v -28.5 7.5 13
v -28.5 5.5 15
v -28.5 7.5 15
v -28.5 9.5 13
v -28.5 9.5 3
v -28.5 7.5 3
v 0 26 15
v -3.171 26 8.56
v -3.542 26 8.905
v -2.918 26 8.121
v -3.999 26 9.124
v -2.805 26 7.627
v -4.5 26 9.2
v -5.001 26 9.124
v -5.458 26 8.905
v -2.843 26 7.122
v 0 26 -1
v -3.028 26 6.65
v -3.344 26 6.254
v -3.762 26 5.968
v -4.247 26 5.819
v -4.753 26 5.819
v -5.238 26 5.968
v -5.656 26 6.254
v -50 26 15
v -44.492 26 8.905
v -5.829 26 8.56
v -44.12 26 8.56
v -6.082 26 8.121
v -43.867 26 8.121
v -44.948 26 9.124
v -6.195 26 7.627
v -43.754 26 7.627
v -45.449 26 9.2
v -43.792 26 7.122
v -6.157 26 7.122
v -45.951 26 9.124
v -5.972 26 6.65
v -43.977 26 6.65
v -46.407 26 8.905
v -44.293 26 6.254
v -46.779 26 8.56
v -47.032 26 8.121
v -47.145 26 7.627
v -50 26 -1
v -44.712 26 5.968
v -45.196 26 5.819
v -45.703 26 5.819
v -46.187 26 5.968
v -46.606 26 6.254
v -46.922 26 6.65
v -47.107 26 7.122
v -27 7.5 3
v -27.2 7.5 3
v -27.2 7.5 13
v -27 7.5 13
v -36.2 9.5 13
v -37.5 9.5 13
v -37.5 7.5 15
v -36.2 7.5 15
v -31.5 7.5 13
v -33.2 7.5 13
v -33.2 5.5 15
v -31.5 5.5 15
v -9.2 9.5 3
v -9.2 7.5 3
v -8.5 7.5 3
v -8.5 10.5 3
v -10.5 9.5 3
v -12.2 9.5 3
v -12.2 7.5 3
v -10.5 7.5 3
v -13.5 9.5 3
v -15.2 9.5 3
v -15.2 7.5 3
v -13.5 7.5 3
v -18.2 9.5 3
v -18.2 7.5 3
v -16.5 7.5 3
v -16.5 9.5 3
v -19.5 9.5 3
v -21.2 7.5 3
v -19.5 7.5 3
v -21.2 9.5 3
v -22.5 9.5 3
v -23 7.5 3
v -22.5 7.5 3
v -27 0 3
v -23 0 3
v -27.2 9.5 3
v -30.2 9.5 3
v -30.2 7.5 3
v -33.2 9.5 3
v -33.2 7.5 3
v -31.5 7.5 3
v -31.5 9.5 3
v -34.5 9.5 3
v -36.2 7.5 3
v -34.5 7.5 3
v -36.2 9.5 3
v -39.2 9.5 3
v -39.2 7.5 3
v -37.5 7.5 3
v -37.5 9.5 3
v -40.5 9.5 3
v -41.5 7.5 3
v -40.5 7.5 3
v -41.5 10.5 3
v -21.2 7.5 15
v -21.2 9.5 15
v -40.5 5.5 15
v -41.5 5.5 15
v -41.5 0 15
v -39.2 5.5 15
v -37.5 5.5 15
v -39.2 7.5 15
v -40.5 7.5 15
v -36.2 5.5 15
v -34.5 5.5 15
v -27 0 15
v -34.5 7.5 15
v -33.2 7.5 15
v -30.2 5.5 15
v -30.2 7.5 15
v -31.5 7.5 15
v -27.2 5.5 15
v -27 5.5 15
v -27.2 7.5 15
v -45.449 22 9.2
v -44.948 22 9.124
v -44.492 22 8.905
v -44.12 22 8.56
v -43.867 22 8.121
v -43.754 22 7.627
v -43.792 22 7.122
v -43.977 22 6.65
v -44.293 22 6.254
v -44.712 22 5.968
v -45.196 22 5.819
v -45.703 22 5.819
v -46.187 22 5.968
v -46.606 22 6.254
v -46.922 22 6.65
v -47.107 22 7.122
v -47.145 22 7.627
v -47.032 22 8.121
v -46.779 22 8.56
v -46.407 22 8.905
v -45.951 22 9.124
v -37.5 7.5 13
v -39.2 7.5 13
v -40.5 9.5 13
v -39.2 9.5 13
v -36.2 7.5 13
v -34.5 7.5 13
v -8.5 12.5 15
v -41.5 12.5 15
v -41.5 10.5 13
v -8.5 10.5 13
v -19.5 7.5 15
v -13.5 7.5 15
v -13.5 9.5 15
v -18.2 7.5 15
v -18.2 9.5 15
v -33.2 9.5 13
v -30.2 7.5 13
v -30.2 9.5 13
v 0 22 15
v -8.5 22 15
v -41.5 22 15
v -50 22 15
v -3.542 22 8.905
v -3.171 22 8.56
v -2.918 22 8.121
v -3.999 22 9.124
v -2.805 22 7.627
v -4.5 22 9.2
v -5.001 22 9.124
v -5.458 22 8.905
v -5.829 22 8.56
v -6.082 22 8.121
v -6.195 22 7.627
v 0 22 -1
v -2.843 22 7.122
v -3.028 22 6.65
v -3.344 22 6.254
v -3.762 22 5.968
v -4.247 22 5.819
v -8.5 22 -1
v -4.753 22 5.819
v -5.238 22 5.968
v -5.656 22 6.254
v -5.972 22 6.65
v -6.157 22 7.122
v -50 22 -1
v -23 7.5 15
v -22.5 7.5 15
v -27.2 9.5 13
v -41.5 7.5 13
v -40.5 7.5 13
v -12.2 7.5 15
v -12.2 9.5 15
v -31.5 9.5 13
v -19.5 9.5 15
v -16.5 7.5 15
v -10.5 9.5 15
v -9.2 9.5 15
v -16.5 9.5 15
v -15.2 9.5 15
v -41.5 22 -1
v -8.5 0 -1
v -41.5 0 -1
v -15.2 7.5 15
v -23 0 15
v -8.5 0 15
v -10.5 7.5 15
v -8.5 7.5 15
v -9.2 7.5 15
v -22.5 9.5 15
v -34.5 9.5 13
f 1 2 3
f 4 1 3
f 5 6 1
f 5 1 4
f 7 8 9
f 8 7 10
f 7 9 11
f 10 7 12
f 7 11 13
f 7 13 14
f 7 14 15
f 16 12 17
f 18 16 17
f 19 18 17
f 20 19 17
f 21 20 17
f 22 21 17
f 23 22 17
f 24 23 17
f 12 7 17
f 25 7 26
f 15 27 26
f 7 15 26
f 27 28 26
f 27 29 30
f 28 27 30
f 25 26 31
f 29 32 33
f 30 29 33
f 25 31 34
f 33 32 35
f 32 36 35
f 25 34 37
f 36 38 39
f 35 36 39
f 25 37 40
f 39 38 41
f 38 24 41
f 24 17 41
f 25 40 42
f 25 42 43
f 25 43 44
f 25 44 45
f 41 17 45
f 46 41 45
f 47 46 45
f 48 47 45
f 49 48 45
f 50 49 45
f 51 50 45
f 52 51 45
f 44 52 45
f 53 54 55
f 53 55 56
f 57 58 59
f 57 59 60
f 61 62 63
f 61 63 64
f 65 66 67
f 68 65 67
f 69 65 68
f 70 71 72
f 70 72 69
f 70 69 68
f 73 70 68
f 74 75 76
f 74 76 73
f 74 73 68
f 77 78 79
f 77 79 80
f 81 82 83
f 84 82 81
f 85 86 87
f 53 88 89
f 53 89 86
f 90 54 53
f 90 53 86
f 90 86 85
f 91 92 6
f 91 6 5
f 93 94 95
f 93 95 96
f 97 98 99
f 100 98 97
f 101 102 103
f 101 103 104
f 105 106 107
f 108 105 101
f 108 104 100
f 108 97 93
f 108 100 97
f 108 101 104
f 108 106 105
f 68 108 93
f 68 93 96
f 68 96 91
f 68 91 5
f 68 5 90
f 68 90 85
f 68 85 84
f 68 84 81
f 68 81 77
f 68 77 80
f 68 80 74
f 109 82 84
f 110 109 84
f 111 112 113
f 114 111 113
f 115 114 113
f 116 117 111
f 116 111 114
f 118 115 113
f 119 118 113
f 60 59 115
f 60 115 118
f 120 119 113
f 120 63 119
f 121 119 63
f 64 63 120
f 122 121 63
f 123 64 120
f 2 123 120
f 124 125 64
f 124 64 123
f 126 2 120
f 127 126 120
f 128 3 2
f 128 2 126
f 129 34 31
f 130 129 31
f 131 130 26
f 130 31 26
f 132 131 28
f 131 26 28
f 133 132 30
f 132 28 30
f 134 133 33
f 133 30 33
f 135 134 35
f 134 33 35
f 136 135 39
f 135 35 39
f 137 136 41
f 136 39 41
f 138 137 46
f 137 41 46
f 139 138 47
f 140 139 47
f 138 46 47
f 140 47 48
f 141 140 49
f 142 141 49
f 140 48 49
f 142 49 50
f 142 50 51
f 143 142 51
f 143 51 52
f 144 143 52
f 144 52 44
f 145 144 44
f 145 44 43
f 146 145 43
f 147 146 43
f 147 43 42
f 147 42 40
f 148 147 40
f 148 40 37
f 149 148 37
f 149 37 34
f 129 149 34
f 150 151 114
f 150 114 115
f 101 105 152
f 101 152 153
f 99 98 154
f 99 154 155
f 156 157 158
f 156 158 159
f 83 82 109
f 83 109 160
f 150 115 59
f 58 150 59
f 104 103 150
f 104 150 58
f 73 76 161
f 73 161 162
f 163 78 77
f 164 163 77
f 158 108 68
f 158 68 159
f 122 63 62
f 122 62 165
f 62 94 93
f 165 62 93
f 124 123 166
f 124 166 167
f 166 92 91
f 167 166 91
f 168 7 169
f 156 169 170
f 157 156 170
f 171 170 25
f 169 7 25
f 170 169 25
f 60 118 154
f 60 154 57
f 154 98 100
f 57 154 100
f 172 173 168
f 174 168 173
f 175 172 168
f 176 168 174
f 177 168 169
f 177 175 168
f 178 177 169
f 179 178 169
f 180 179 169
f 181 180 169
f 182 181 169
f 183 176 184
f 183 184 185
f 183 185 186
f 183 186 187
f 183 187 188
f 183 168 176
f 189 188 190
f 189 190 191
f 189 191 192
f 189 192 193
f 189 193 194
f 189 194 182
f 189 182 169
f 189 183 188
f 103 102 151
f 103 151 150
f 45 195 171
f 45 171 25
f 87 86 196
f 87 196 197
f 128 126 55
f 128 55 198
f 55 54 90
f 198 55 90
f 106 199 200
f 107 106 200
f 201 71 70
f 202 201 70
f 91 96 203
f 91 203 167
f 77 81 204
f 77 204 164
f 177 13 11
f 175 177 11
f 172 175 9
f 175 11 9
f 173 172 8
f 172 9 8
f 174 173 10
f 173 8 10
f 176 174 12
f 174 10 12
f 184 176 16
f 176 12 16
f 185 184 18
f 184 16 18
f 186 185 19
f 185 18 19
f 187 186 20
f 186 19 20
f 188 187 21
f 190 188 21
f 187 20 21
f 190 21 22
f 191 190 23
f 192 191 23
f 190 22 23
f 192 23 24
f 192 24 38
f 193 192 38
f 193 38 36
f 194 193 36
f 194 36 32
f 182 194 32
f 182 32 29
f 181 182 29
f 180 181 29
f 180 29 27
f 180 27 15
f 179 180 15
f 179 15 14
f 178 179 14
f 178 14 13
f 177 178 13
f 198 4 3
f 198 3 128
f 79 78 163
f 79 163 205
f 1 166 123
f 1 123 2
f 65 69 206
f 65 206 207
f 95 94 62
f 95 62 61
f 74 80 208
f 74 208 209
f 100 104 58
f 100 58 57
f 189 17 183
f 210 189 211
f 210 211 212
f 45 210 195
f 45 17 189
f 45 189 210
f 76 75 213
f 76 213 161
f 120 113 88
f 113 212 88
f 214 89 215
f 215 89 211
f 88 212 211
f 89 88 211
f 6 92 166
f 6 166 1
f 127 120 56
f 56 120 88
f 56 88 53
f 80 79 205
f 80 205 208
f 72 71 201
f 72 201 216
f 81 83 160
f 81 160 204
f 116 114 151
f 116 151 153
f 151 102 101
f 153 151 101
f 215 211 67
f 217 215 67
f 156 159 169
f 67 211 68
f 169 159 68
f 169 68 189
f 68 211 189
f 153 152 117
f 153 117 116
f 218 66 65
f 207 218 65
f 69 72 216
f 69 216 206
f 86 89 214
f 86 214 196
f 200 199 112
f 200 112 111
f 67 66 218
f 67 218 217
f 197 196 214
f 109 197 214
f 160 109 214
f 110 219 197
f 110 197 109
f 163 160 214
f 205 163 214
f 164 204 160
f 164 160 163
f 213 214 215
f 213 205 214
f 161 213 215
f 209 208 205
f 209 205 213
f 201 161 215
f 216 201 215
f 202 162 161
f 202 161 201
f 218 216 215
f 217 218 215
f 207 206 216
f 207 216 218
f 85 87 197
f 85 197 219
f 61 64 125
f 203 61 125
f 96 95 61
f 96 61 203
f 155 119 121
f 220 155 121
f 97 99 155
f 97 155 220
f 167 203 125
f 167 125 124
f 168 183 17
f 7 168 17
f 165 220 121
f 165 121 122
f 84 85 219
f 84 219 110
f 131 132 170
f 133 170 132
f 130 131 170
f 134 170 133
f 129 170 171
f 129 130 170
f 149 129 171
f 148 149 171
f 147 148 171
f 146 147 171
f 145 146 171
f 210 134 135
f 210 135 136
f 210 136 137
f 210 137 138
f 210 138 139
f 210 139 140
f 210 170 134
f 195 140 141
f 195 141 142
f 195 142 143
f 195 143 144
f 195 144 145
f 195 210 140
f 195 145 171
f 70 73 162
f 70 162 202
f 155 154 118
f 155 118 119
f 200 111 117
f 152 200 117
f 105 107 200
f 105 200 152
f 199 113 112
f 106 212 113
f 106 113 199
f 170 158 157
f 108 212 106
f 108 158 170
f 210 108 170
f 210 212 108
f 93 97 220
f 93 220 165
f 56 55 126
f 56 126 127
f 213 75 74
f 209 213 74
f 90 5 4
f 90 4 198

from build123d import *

# Parameters (mm, degrees)
SKETCH1_W            = 50
SKETCH1_H            = 26
BOSS_EXTRUDE1_DEPTH  = 16
SKETCH2_W            = 8.5
SKETCH2_H            = 22
CUT_EXTRUDE1_DEPTH   = 59.583274064
SKETCH3_W            = 8.5
SKETCH3_H            = 22
CUT_EXTRUDE2_DEPTH   = 59.583274064
SKETCH4_W            = 12
SKETCH4_H            = 10.5
CUT_EXTRUDE3_DEPTH   = 52.217672731
SKETCH5_W            = 14.5
SKETCH5_H            = 7.5
BOSS_EXTRUDE2_DEPTH  = 12
SKETCH6_W            = 1.3
SKETCH6_H            = 2
BOSS_EXTRUDE3_DEPTH  = 12
SKETCH7_W            = 1.3
SKETCH7_H            = 2
BOSS_EXTRUDE4_DEPTH  = 12
SKETCH8_W            = 1.3
SKETCH8_H            = 2
BOSS_EXTRUDE5_DEPTH  = 12
SKETCH9_W            = 1.3
SKETCH9_H            = 2
BOSS_EXTRUDE6_DEPTH  = 12
SKETCH10_W           = 1.3
SKETCH10_H           = 2
BOSS_EXTRUDE7_DEPTH  = 12
SKETCH11_W           = 14.5
SKETCH11_H           = 7.5
BOSS_EXTRUDE8_DEPTH  = 12
SKETCH12_W           = 1.3
SKETCH12_H           = 2
BOSS_EXTRUDE9_DEPTH  = 12
SKETCH13_W           = 1.3
SKETCH13_H           = 2
BOSS_EXTRUDE10_DEPTH = 12
SKETCH14_W           = 1.3
SKETCH14_H           = 2
BOSS_EXTRUDE11_DEPTH = 12
SKETCH15_W           = 1.3
SKETCH15_H           = 2
BOSS_EXTRUDE12_DEPTH = 12
SKETCH16_W           = 1.3
SKETCH16_H           = 2
BOSS_EXTRUDE13_DEPTH = 12
SKETCH17_R           = 1.7
CUT_EXTRUDE4_DEPTH   = 59.318093247
SKETCH18_R           = 1.7
CUT_EXTRUDE5_DEPTH   = 59.318093247
CHAMFER2_SIZE        = 2


with BuildPart() as part:
    # Sketch1 → Boss-Extrude1 (new body)
    with BuildSketch(Plane(origin=(0, 0, -1), x_dir=(-1, 0, 0), z_dir=(0, 0, -1))):
        with Locations((25, 13)):
            Rectangle(SKETCH1_W, SKETCH1_H)
    extrude(amount=-BOSS_EXTRUDE1_DEPTH)

    # Sketch2 → Cut-Extrude1 (cut, through all)
    with BuildSketch(Plane(origin=(0, 0, -1), x_dir=(-1, 0, 0), z_dir=(0, 0, -1))):
        with Locations((45.75, 11)):
            Rectangle(SKETCH2_W, SKETCH2_H)
    extrude(amount=-CUT_EXTRUDE1_DEPTH, mode=Mode.SUBTRACT)

    # Sketch3 → Cut-Extrude2 (cut, through all)
    with BuildSketch(Plane(origin=(0, 0, -1), x_dir=(-1, 0, 0), z_dir=(0, 0, -1))):
        with Locations((4.25, 11)):
            Rectangle(SKETCH3_W, SKETCH3_H)
    extrude(amount=-CUT_EXTRUDE2_DEPTH, mode=Mode.SUBTRACT)

    # Sketch4 → Cut-Extrude3 (cut, through all)
    with BuildSketch(Plane.ZY.offset(41.5)):
        with Locations((9, 5.25)):
            Rectangle(SKETCH4_W, SKETCH4_H)
    extrude(amount=-CUT_EXTRUDE3_DEPTH, mode=Mode.SUBTRACT)

    # Sketch5 → Boss-Extrude2 (add)
    with BuildSketch(Plane.XY.offset(3)):
        with Locations((-15.75, 3.75)):
            Rectangle(SKETCH5_W, SKETCH5_H)
    extrude(amount=BOSS_EXTRUDE2_DEPTH)

    # Sketch6 → Boss-Extrude3 (add)
    with BuildSketch(Plane.XY.offset(3)):
        with Locations((-9.85, 8.5)):
            Rectangle(SKETCH6_W, SKETCH6_H)
    extrude(amount=BOSS_EXTRUDE3_DEPTH)

    # Sketch7 → Boss-Extrude4 (add)
    with BuildSketch(Plane.XY.offset(3)):
        with Locations((-12.85, 8.5)):
            Rectangle(SKETCH7_W, SKETCH7_H)
    extrude(amount=BOSS_EXTRUDE4_DEPTH)

    # Sketch8 → Boss-Extrude5 (add)
    with BuildSketch(Plane.XY.offset(3)):
        with Locations((-15.85, 8.5)):
            Rectangle(SKETCH8_W, SKETCH8_H)
    extrude(amount=BOSS_EXTRUDE5_DEPTH)

    # Sketch9 → Boss-Extrude6 (add)
    with BuildSketch(Plane.XY.offset(3)):
        with Locations((-18.85, 8.5)):
            Rectangle(SKETCH9_W, SKETCH9_H)
    extrude(amount=BOSS_EXTRUDE6_DEPTH)

    # Sketch10 → Boss-Extrude7 (add)
    with BuildSketch(Plane.XY.offset(3)):
        with Locations((-21.85, 8.5)):
            Rectangle(SKETCH10_W, SKETCH10_H)
    extrude(amount=BOSS_EXTRUDE7_DEPTH)

    # Sketch11 → Boss-Extrude8 (add)
    with BuildSketch(Plane.XY.offset(3)):
        with Locations((-34.25, 3.75)):
            Rectangle(SKETCH11_W, SKETCH11_H)
    extrude(amount=BOSS_EXTRUDE8_DEPTH)

    # Sketch12 → Boss-Extrude9 (add)
    with BuildSketch(Plane.XY.offset(3)):
        with Locations((-27.85, 8.5)):
            Rectangle(SKETCH12_W, SKETCH12_H)
    extrude(amount=BOSS_EXTRUDE9_DEPTH)

    # Sketch13 → Boss-Extrude10 (add)
    with BuildSketch(Plane.XY.offset(3)):
        with Locations((-30.85, 8.5)):
            Rectangle(SKETCH13_W, SKETCH13_H)
    extrude(amount=BOSS_EXTRUDE10_DEPTH)

    # Sketch14 → Boss-Extrude11 (add)
    with BuildSketch(Plane.XY.offset(3)):
        with Locations((-33.85, 8.5)):
            Rectangle(SKETCH14_W, SKETCH14_H)
    extrude(amount=BOSS_EXTRUDE11_DEPTH)

    # Sketch15 → Boss-Extrude12 (add)
    with BuildSketch(Plane.XY.offset(3)):
        with Locations((-36.85, 8.5)):
            Rectangle(SKETCH15_W, SKETCH15_H)
    extrude(amount=BOSS_EXTRUDE12_DEPTH)

    # Sketch16 → Boss-Extrude13 (add)
    with BuildSketch(Plane.XY.offset(3)):
        with Locations((-39.85, 8.5)):
            Rectangle(SKETCH16_W, SKETCH16_H)
    extrude(amount=BOSS_EXTRUDE13_DEPTH)

    # Sketch17 → Cut-Extrude4 (cut, through all)
    with BuildSketch(Plane(origin=(0, 26, 0), x_dir=(-1, 0, 0), z_dir=(0, 1, 0))):
        with Locations(Location((4.5, 7.5, 0), (0, 0, 90))):
            Circle(SKETCH17_R)
    extrude(amount=-CUT_EXTRUDE4_DEPTH, mode=Mode.SUBTRACT)

    # Sketch18 → Cut-Extrude5 (cut, through all)
    with BuildSketch(Plane(origin=(0, 26, 0), x_dir=(-1, 0, 0), z_dir=(0, 1, 0))):
        with Locations(Location((45.449445698, 7.5, 0), (0, 0, 90))):
            Circle(SKETCH18_R)
    extrude(amount=-CUT_EXTRUDE5_DEPTH, mode=Mode.SUBTRACT)

    # Chamfer2
    chamfer2_edges = [part.edges().sort_by_distance(p)[0] for p in [
        (-39.85, 9.5, 15),
        (-38.35, 7.5, 15),
        (-36.85, 9.5, 15),
        (-35.35, 7.5, 15),
        (-33.85, 9.5, 15),
        (-32.35, 7.5, 15),
        (-30.85, 9.5, 15),
        (-29.35, 7.5, 15),
        (-27.85, 9.5, 15),
        (-27.1, 7.5, 15),
        (-41, 7.5, 15),
        (-25, 10.5, 15),
    ]]
    chamfer(chamfer2_edges, length=CHAMFER2_SIZE - 0.0001)  # a hair under: the kernel refuses the full size


solid = part.part
